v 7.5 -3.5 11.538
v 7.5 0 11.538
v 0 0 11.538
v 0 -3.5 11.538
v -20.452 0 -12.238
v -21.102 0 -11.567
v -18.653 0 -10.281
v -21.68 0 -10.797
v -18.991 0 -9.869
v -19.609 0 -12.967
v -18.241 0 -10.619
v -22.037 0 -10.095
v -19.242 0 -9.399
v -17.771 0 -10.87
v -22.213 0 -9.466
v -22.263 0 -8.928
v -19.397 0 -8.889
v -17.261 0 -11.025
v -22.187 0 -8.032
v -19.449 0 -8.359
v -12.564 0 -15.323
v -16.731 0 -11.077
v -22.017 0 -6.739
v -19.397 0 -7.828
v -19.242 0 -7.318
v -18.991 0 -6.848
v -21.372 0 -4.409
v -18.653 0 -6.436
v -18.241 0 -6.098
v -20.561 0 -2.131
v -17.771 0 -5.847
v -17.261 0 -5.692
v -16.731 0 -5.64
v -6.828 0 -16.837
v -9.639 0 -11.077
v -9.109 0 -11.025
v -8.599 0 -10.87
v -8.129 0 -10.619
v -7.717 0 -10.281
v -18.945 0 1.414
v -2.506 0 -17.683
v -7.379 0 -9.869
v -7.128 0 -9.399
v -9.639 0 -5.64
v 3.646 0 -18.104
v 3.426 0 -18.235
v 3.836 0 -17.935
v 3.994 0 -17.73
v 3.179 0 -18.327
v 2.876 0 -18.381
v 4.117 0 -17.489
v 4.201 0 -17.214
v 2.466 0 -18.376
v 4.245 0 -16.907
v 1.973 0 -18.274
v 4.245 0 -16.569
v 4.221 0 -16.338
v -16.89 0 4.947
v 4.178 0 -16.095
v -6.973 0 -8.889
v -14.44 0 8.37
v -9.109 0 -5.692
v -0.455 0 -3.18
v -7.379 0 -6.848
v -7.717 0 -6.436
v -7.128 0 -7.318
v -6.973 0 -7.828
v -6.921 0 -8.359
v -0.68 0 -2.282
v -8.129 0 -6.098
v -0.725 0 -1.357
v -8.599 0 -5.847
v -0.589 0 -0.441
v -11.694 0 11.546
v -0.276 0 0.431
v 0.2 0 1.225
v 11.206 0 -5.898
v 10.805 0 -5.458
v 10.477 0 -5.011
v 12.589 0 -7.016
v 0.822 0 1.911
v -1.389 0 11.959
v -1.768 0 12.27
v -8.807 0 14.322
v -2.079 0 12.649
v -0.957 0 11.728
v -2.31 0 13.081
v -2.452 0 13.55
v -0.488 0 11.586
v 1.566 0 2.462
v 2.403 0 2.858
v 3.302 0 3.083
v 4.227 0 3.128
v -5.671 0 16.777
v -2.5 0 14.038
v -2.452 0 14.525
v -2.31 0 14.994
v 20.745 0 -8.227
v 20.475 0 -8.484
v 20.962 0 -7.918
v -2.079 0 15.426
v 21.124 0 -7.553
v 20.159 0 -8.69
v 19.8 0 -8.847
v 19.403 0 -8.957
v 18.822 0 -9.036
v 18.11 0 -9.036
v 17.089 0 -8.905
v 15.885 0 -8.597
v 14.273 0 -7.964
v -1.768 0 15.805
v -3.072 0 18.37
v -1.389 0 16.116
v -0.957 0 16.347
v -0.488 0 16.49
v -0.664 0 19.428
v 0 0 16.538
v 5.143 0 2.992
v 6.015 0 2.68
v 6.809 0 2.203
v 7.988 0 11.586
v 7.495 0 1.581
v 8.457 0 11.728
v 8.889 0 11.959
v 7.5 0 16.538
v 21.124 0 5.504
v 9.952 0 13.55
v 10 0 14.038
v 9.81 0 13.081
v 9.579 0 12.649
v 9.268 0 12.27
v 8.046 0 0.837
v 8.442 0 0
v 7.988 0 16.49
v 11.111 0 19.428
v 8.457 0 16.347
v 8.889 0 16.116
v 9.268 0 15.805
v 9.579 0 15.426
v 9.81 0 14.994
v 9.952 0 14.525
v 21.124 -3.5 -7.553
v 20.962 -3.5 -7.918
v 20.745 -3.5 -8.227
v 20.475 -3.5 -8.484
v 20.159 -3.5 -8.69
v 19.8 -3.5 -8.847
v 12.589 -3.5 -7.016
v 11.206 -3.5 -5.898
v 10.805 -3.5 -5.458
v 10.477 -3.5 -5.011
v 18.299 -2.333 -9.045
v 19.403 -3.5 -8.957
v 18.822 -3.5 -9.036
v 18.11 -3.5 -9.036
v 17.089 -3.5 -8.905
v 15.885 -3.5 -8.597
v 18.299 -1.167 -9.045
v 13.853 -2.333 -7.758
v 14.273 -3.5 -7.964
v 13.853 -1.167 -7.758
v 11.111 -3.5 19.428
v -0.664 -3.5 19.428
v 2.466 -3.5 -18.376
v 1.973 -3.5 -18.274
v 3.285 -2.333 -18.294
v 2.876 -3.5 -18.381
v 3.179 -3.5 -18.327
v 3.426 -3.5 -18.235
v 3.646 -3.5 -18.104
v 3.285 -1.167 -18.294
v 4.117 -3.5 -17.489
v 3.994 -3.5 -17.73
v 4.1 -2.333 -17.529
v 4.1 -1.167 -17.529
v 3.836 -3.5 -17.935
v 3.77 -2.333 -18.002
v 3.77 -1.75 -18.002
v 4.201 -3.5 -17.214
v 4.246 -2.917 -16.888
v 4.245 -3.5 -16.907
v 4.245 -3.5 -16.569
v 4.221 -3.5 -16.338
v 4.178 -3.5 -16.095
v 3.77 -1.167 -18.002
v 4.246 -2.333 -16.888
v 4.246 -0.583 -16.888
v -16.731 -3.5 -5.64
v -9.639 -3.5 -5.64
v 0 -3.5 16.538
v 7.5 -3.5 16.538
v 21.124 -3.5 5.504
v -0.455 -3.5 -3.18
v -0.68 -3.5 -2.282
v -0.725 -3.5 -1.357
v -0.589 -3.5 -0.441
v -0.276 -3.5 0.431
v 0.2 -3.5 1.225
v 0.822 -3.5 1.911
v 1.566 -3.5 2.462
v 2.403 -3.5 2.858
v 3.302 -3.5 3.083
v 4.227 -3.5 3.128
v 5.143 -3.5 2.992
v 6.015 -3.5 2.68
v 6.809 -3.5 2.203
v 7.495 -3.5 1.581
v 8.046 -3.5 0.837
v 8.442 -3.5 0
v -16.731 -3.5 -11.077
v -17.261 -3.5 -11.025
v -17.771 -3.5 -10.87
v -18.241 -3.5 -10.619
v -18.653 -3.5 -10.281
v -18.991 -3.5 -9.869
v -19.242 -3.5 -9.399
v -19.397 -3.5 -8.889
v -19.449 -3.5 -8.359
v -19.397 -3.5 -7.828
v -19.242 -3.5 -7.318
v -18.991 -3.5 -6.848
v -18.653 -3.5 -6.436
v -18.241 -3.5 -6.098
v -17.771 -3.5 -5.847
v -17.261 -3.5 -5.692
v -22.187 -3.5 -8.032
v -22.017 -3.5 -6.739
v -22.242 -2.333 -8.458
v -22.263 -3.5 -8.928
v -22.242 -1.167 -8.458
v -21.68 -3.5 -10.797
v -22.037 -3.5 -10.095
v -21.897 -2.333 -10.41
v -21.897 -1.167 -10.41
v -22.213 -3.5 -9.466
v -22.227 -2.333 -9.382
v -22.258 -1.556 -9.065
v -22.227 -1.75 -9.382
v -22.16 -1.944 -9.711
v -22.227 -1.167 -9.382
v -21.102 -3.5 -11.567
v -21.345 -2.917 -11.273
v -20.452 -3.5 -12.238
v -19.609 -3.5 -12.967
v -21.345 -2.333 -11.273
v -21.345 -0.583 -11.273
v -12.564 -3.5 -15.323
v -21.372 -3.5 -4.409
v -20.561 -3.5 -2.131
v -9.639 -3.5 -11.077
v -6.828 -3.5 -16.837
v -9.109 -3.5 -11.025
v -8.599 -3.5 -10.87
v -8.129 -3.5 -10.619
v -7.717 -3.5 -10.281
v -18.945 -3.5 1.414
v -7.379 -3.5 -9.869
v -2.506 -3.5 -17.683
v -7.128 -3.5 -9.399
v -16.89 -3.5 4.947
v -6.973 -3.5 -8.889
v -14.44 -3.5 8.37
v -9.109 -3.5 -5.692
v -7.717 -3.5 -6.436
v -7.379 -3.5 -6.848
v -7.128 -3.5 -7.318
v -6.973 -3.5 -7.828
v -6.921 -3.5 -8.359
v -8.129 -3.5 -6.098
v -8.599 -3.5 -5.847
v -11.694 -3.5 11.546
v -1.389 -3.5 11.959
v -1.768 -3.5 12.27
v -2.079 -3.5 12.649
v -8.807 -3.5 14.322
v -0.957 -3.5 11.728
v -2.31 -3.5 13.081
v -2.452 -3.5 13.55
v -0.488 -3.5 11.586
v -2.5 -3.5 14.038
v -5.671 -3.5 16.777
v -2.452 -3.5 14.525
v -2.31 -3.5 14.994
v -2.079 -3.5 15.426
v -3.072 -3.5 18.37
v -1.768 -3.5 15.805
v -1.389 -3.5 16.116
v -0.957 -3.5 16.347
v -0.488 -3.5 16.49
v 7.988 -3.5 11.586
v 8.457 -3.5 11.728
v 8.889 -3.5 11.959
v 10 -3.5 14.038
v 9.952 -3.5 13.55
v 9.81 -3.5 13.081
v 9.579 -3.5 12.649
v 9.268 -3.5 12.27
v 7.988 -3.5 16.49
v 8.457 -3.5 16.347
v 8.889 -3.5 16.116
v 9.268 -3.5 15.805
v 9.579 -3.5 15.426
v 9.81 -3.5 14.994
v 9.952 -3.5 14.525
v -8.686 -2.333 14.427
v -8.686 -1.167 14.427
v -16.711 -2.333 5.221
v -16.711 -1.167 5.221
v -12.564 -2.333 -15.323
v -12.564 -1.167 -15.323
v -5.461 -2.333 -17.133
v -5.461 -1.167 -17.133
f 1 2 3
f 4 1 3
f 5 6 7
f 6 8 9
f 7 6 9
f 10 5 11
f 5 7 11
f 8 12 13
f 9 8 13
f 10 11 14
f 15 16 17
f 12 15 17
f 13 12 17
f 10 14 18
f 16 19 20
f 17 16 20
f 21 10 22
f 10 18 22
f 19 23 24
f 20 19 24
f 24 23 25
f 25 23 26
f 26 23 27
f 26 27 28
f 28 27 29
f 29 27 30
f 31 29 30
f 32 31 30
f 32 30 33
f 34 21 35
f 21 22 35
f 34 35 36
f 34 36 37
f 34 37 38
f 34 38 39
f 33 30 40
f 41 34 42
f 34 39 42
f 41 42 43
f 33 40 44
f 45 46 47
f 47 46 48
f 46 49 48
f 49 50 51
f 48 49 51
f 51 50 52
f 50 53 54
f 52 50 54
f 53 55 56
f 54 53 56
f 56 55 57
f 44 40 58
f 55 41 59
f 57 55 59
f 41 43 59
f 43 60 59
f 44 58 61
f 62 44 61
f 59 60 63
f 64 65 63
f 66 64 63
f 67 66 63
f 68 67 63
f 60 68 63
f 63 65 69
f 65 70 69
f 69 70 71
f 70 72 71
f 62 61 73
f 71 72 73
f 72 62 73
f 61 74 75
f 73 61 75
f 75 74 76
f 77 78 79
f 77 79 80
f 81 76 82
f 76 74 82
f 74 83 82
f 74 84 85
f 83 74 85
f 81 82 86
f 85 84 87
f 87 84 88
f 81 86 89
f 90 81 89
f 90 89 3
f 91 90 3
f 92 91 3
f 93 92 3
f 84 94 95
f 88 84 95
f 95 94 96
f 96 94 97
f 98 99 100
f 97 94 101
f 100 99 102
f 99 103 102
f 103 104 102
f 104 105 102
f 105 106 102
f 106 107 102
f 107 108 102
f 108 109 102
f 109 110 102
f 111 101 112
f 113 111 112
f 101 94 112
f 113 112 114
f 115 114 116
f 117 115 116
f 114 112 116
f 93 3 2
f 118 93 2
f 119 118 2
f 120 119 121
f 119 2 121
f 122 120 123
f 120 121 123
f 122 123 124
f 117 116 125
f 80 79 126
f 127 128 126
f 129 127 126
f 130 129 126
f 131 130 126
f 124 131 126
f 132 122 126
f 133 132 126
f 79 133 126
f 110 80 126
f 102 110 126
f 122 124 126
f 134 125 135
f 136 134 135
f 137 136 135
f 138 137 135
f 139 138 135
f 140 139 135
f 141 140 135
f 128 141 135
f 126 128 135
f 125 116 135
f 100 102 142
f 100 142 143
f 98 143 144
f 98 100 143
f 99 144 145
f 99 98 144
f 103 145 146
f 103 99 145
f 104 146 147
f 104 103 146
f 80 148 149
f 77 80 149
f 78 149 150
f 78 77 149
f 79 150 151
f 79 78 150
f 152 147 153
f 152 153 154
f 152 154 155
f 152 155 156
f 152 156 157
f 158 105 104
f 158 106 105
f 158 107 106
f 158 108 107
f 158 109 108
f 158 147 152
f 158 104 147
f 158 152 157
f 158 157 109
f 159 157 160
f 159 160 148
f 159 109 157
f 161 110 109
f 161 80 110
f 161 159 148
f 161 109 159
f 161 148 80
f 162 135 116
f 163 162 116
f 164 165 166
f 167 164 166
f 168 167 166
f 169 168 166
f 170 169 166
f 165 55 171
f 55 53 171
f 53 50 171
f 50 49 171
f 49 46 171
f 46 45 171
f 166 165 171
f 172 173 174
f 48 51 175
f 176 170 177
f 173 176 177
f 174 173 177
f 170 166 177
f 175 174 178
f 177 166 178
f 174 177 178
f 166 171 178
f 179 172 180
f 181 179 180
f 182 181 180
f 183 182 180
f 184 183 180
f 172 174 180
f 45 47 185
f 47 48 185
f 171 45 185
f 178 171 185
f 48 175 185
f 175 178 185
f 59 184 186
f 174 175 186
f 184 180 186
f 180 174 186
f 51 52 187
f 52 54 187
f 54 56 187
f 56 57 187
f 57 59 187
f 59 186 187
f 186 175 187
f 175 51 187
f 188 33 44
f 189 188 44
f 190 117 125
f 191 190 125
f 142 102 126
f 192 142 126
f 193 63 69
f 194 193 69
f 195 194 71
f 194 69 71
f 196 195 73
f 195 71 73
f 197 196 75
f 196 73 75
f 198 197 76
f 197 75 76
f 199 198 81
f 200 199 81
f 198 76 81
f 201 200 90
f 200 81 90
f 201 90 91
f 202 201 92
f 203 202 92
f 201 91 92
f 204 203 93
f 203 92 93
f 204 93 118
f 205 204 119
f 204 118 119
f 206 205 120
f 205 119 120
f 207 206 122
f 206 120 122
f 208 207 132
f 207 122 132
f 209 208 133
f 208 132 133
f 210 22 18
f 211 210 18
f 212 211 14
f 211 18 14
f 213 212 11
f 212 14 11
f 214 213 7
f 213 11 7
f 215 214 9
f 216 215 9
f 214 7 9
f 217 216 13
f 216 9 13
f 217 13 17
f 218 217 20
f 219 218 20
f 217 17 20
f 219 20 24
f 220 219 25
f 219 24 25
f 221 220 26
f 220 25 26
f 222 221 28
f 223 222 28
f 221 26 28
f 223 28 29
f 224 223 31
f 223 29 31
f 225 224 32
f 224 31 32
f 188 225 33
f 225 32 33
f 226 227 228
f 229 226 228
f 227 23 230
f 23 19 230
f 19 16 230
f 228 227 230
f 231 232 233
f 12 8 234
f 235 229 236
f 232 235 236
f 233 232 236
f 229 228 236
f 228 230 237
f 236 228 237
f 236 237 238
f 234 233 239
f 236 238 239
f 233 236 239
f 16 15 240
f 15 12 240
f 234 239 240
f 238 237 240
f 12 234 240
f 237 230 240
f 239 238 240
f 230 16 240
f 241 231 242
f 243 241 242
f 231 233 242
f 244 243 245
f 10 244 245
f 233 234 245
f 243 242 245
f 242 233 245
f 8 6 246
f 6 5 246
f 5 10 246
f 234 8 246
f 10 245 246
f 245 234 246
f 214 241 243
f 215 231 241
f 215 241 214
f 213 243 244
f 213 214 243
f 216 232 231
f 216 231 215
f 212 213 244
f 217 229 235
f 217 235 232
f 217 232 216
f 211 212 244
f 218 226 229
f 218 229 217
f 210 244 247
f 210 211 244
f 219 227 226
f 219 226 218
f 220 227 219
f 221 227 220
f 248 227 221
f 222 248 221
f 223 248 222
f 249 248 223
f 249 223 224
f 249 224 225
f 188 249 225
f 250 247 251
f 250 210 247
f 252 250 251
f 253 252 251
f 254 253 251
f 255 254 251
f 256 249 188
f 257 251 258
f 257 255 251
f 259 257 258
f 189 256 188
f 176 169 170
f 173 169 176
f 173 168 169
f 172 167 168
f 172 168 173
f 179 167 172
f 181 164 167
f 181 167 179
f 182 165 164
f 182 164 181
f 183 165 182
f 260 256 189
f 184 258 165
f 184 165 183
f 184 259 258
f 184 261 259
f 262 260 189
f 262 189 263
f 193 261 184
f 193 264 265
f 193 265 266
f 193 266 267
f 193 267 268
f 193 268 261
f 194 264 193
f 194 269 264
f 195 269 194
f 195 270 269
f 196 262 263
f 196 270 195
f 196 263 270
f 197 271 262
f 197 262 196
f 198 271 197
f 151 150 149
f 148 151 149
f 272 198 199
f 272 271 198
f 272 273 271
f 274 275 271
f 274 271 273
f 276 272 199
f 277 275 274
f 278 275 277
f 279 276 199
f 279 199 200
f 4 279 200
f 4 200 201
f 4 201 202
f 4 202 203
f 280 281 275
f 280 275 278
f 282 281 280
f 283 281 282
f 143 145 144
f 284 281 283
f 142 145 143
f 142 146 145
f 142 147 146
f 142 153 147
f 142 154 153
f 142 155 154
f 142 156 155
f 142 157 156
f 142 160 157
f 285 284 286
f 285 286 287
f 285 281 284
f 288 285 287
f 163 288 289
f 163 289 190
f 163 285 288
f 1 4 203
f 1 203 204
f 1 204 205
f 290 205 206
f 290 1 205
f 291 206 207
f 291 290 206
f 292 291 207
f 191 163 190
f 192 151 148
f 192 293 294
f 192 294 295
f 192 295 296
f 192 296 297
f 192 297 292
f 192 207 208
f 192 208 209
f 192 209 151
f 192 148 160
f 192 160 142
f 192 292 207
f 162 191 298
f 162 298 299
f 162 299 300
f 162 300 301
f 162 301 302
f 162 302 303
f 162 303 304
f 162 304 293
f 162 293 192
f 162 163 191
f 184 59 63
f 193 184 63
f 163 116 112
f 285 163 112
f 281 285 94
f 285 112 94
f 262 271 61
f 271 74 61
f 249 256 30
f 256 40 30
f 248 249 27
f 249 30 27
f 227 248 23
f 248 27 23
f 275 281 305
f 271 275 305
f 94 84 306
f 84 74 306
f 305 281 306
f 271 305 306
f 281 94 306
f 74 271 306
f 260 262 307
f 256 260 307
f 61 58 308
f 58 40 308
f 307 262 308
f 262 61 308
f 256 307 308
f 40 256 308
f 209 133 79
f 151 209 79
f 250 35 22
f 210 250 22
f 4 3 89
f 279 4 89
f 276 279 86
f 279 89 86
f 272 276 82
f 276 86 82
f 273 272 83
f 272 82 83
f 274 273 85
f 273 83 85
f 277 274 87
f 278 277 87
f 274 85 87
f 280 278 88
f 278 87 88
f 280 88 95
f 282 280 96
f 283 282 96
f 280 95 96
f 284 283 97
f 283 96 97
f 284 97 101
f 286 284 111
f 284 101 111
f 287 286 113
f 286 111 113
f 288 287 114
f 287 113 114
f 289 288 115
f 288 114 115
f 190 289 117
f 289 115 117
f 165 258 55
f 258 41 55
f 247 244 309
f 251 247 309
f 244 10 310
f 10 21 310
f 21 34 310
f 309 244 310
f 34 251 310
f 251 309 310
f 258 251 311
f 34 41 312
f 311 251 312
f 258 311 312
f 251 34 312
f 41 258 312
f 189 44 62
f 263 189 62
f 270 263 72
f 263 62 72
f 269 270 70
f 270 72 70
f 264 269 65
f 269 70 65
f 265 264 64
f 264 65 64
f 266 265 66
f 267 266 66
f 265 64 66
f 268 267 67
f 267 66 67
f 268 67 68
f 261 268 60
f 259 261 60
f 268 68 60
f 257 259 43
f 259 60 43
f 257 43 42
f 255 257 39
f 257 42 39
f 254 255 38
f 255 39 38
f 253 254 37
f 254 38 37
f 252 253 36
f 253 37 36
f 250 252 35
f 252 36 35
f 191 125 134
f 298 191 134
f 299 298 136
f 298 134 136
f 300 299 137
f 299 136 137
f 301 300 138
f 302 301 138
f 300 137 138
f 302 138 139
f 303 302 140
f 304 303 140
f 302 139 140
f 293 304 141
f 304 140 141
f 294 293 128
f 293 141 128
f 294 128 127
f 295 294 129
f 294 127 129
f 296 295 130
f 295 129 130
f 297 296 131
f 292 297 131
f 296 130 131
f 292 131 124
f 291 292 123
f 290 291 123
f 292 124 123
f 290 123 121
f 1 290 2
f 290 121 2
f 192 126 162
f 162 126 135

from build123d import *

# Parameters (mm, degrees)
F1_DEPTH = 3.5


with BuildPart() as f1:
    # F0 (on Front) → F1 (new body)
    with BuildSketch(Plane.XZ):
        with BuildLine():
            Line((11.111137, 19.428022), (-0.664115, 19.428022))
            add(Edge.make_bspline(
                [(-0.664115, 19.428022), (-7.776919, 17.012886), (-18.978179, 6.115542), (-22.016576, -6.739209)],
                knots=[0, 0, 0, 0, 33.773533, 33.773533, 33.773533, 33.773533], degree=3))
            add(Edge.make_bspline(
                [(-22.016576, -6.739209), (-22.068911, -8.466247), (-23.326607, -9.983946), (-19.60919, -12.96701)],
                knots=[0, 0, 0, 0, 6.676901, 6.676901, 6.676901, 6.676901], degree=3))
            add(Edge.make_bspline(
                [(-19.60919, -12.96701), (-12.502755, -15.554382), (-5.717248, -17.509151), (1.972557, -18.273501)],
                knots=[0, 0, 0, 0, 22.22455, 22.22455, 22.22455, 22.22455], degree=3))
            add(Edge.make_bspline(
                [(1.972557, -18.273501), (3.454669, -18.725327), (4.548717, -17.823574), (4.177886, -16.095417)],
                knots=[0, 0, 0, 0, 3.099601, 3.099601, 3.099601, 3.099601], degree=3))
            Line((4.177886, -16.095417), (-0.454777, -3.180466))
            ThreePointArc((-0.454777, -3.180466), (2.403419, 2.858196), (8.442081, 0))
            Line((8.442081, 0), (10.477334, -5.011199))
            add(Edge.make_bspline(
                [(21.124166, -7.553054), (20.007996, -10.873632), (12.419499, -8.047571), (10.477334, -5.011199)],
                knots=[0, 0, 0, 0, 10.946052, 10.946052, 10.946052, 10.946052], degree=3))
            Line((21.124166, -7.553054), (21.124166, 5.503655))
            Line((21.124166, 5.503655), (11.111137, 19.428022))
        make_face()
        with BuildLine():
            ThreePointArc((-16.730794, -11.07734), (-19.449372, -8.358763), (-16.730794, -5.640186))
            Line((-16.730794, -5.640186), (-9.639258, -5.640186))
            ThreePointArc((-9.639258, -5.640186), (-6.920681, -8.358763), (-9.639258, -11.07734))
            Line((-9.639258, -11.07734), (-16.730794, -11.07734))
        make_face(mode=Mode.SUBTRACT)
        with BuildLine():
            ThreePointArc((0, 11.537572), (-2.5, 14.037572), (0, 16.537572))
            Line((0, 16.537572), (7.50006, 16.537572))
            ThreePointArc((7.50006, 16.537572), (10.00006, 14.037572), (7.50006, 11.537572))
            Line((7.50006, 11.537572), (0, 11.537572))
        make_face(mode=Mode.SUBTRACT)
    extrude(amount=F1_DEPTH)


solid = f1.part
